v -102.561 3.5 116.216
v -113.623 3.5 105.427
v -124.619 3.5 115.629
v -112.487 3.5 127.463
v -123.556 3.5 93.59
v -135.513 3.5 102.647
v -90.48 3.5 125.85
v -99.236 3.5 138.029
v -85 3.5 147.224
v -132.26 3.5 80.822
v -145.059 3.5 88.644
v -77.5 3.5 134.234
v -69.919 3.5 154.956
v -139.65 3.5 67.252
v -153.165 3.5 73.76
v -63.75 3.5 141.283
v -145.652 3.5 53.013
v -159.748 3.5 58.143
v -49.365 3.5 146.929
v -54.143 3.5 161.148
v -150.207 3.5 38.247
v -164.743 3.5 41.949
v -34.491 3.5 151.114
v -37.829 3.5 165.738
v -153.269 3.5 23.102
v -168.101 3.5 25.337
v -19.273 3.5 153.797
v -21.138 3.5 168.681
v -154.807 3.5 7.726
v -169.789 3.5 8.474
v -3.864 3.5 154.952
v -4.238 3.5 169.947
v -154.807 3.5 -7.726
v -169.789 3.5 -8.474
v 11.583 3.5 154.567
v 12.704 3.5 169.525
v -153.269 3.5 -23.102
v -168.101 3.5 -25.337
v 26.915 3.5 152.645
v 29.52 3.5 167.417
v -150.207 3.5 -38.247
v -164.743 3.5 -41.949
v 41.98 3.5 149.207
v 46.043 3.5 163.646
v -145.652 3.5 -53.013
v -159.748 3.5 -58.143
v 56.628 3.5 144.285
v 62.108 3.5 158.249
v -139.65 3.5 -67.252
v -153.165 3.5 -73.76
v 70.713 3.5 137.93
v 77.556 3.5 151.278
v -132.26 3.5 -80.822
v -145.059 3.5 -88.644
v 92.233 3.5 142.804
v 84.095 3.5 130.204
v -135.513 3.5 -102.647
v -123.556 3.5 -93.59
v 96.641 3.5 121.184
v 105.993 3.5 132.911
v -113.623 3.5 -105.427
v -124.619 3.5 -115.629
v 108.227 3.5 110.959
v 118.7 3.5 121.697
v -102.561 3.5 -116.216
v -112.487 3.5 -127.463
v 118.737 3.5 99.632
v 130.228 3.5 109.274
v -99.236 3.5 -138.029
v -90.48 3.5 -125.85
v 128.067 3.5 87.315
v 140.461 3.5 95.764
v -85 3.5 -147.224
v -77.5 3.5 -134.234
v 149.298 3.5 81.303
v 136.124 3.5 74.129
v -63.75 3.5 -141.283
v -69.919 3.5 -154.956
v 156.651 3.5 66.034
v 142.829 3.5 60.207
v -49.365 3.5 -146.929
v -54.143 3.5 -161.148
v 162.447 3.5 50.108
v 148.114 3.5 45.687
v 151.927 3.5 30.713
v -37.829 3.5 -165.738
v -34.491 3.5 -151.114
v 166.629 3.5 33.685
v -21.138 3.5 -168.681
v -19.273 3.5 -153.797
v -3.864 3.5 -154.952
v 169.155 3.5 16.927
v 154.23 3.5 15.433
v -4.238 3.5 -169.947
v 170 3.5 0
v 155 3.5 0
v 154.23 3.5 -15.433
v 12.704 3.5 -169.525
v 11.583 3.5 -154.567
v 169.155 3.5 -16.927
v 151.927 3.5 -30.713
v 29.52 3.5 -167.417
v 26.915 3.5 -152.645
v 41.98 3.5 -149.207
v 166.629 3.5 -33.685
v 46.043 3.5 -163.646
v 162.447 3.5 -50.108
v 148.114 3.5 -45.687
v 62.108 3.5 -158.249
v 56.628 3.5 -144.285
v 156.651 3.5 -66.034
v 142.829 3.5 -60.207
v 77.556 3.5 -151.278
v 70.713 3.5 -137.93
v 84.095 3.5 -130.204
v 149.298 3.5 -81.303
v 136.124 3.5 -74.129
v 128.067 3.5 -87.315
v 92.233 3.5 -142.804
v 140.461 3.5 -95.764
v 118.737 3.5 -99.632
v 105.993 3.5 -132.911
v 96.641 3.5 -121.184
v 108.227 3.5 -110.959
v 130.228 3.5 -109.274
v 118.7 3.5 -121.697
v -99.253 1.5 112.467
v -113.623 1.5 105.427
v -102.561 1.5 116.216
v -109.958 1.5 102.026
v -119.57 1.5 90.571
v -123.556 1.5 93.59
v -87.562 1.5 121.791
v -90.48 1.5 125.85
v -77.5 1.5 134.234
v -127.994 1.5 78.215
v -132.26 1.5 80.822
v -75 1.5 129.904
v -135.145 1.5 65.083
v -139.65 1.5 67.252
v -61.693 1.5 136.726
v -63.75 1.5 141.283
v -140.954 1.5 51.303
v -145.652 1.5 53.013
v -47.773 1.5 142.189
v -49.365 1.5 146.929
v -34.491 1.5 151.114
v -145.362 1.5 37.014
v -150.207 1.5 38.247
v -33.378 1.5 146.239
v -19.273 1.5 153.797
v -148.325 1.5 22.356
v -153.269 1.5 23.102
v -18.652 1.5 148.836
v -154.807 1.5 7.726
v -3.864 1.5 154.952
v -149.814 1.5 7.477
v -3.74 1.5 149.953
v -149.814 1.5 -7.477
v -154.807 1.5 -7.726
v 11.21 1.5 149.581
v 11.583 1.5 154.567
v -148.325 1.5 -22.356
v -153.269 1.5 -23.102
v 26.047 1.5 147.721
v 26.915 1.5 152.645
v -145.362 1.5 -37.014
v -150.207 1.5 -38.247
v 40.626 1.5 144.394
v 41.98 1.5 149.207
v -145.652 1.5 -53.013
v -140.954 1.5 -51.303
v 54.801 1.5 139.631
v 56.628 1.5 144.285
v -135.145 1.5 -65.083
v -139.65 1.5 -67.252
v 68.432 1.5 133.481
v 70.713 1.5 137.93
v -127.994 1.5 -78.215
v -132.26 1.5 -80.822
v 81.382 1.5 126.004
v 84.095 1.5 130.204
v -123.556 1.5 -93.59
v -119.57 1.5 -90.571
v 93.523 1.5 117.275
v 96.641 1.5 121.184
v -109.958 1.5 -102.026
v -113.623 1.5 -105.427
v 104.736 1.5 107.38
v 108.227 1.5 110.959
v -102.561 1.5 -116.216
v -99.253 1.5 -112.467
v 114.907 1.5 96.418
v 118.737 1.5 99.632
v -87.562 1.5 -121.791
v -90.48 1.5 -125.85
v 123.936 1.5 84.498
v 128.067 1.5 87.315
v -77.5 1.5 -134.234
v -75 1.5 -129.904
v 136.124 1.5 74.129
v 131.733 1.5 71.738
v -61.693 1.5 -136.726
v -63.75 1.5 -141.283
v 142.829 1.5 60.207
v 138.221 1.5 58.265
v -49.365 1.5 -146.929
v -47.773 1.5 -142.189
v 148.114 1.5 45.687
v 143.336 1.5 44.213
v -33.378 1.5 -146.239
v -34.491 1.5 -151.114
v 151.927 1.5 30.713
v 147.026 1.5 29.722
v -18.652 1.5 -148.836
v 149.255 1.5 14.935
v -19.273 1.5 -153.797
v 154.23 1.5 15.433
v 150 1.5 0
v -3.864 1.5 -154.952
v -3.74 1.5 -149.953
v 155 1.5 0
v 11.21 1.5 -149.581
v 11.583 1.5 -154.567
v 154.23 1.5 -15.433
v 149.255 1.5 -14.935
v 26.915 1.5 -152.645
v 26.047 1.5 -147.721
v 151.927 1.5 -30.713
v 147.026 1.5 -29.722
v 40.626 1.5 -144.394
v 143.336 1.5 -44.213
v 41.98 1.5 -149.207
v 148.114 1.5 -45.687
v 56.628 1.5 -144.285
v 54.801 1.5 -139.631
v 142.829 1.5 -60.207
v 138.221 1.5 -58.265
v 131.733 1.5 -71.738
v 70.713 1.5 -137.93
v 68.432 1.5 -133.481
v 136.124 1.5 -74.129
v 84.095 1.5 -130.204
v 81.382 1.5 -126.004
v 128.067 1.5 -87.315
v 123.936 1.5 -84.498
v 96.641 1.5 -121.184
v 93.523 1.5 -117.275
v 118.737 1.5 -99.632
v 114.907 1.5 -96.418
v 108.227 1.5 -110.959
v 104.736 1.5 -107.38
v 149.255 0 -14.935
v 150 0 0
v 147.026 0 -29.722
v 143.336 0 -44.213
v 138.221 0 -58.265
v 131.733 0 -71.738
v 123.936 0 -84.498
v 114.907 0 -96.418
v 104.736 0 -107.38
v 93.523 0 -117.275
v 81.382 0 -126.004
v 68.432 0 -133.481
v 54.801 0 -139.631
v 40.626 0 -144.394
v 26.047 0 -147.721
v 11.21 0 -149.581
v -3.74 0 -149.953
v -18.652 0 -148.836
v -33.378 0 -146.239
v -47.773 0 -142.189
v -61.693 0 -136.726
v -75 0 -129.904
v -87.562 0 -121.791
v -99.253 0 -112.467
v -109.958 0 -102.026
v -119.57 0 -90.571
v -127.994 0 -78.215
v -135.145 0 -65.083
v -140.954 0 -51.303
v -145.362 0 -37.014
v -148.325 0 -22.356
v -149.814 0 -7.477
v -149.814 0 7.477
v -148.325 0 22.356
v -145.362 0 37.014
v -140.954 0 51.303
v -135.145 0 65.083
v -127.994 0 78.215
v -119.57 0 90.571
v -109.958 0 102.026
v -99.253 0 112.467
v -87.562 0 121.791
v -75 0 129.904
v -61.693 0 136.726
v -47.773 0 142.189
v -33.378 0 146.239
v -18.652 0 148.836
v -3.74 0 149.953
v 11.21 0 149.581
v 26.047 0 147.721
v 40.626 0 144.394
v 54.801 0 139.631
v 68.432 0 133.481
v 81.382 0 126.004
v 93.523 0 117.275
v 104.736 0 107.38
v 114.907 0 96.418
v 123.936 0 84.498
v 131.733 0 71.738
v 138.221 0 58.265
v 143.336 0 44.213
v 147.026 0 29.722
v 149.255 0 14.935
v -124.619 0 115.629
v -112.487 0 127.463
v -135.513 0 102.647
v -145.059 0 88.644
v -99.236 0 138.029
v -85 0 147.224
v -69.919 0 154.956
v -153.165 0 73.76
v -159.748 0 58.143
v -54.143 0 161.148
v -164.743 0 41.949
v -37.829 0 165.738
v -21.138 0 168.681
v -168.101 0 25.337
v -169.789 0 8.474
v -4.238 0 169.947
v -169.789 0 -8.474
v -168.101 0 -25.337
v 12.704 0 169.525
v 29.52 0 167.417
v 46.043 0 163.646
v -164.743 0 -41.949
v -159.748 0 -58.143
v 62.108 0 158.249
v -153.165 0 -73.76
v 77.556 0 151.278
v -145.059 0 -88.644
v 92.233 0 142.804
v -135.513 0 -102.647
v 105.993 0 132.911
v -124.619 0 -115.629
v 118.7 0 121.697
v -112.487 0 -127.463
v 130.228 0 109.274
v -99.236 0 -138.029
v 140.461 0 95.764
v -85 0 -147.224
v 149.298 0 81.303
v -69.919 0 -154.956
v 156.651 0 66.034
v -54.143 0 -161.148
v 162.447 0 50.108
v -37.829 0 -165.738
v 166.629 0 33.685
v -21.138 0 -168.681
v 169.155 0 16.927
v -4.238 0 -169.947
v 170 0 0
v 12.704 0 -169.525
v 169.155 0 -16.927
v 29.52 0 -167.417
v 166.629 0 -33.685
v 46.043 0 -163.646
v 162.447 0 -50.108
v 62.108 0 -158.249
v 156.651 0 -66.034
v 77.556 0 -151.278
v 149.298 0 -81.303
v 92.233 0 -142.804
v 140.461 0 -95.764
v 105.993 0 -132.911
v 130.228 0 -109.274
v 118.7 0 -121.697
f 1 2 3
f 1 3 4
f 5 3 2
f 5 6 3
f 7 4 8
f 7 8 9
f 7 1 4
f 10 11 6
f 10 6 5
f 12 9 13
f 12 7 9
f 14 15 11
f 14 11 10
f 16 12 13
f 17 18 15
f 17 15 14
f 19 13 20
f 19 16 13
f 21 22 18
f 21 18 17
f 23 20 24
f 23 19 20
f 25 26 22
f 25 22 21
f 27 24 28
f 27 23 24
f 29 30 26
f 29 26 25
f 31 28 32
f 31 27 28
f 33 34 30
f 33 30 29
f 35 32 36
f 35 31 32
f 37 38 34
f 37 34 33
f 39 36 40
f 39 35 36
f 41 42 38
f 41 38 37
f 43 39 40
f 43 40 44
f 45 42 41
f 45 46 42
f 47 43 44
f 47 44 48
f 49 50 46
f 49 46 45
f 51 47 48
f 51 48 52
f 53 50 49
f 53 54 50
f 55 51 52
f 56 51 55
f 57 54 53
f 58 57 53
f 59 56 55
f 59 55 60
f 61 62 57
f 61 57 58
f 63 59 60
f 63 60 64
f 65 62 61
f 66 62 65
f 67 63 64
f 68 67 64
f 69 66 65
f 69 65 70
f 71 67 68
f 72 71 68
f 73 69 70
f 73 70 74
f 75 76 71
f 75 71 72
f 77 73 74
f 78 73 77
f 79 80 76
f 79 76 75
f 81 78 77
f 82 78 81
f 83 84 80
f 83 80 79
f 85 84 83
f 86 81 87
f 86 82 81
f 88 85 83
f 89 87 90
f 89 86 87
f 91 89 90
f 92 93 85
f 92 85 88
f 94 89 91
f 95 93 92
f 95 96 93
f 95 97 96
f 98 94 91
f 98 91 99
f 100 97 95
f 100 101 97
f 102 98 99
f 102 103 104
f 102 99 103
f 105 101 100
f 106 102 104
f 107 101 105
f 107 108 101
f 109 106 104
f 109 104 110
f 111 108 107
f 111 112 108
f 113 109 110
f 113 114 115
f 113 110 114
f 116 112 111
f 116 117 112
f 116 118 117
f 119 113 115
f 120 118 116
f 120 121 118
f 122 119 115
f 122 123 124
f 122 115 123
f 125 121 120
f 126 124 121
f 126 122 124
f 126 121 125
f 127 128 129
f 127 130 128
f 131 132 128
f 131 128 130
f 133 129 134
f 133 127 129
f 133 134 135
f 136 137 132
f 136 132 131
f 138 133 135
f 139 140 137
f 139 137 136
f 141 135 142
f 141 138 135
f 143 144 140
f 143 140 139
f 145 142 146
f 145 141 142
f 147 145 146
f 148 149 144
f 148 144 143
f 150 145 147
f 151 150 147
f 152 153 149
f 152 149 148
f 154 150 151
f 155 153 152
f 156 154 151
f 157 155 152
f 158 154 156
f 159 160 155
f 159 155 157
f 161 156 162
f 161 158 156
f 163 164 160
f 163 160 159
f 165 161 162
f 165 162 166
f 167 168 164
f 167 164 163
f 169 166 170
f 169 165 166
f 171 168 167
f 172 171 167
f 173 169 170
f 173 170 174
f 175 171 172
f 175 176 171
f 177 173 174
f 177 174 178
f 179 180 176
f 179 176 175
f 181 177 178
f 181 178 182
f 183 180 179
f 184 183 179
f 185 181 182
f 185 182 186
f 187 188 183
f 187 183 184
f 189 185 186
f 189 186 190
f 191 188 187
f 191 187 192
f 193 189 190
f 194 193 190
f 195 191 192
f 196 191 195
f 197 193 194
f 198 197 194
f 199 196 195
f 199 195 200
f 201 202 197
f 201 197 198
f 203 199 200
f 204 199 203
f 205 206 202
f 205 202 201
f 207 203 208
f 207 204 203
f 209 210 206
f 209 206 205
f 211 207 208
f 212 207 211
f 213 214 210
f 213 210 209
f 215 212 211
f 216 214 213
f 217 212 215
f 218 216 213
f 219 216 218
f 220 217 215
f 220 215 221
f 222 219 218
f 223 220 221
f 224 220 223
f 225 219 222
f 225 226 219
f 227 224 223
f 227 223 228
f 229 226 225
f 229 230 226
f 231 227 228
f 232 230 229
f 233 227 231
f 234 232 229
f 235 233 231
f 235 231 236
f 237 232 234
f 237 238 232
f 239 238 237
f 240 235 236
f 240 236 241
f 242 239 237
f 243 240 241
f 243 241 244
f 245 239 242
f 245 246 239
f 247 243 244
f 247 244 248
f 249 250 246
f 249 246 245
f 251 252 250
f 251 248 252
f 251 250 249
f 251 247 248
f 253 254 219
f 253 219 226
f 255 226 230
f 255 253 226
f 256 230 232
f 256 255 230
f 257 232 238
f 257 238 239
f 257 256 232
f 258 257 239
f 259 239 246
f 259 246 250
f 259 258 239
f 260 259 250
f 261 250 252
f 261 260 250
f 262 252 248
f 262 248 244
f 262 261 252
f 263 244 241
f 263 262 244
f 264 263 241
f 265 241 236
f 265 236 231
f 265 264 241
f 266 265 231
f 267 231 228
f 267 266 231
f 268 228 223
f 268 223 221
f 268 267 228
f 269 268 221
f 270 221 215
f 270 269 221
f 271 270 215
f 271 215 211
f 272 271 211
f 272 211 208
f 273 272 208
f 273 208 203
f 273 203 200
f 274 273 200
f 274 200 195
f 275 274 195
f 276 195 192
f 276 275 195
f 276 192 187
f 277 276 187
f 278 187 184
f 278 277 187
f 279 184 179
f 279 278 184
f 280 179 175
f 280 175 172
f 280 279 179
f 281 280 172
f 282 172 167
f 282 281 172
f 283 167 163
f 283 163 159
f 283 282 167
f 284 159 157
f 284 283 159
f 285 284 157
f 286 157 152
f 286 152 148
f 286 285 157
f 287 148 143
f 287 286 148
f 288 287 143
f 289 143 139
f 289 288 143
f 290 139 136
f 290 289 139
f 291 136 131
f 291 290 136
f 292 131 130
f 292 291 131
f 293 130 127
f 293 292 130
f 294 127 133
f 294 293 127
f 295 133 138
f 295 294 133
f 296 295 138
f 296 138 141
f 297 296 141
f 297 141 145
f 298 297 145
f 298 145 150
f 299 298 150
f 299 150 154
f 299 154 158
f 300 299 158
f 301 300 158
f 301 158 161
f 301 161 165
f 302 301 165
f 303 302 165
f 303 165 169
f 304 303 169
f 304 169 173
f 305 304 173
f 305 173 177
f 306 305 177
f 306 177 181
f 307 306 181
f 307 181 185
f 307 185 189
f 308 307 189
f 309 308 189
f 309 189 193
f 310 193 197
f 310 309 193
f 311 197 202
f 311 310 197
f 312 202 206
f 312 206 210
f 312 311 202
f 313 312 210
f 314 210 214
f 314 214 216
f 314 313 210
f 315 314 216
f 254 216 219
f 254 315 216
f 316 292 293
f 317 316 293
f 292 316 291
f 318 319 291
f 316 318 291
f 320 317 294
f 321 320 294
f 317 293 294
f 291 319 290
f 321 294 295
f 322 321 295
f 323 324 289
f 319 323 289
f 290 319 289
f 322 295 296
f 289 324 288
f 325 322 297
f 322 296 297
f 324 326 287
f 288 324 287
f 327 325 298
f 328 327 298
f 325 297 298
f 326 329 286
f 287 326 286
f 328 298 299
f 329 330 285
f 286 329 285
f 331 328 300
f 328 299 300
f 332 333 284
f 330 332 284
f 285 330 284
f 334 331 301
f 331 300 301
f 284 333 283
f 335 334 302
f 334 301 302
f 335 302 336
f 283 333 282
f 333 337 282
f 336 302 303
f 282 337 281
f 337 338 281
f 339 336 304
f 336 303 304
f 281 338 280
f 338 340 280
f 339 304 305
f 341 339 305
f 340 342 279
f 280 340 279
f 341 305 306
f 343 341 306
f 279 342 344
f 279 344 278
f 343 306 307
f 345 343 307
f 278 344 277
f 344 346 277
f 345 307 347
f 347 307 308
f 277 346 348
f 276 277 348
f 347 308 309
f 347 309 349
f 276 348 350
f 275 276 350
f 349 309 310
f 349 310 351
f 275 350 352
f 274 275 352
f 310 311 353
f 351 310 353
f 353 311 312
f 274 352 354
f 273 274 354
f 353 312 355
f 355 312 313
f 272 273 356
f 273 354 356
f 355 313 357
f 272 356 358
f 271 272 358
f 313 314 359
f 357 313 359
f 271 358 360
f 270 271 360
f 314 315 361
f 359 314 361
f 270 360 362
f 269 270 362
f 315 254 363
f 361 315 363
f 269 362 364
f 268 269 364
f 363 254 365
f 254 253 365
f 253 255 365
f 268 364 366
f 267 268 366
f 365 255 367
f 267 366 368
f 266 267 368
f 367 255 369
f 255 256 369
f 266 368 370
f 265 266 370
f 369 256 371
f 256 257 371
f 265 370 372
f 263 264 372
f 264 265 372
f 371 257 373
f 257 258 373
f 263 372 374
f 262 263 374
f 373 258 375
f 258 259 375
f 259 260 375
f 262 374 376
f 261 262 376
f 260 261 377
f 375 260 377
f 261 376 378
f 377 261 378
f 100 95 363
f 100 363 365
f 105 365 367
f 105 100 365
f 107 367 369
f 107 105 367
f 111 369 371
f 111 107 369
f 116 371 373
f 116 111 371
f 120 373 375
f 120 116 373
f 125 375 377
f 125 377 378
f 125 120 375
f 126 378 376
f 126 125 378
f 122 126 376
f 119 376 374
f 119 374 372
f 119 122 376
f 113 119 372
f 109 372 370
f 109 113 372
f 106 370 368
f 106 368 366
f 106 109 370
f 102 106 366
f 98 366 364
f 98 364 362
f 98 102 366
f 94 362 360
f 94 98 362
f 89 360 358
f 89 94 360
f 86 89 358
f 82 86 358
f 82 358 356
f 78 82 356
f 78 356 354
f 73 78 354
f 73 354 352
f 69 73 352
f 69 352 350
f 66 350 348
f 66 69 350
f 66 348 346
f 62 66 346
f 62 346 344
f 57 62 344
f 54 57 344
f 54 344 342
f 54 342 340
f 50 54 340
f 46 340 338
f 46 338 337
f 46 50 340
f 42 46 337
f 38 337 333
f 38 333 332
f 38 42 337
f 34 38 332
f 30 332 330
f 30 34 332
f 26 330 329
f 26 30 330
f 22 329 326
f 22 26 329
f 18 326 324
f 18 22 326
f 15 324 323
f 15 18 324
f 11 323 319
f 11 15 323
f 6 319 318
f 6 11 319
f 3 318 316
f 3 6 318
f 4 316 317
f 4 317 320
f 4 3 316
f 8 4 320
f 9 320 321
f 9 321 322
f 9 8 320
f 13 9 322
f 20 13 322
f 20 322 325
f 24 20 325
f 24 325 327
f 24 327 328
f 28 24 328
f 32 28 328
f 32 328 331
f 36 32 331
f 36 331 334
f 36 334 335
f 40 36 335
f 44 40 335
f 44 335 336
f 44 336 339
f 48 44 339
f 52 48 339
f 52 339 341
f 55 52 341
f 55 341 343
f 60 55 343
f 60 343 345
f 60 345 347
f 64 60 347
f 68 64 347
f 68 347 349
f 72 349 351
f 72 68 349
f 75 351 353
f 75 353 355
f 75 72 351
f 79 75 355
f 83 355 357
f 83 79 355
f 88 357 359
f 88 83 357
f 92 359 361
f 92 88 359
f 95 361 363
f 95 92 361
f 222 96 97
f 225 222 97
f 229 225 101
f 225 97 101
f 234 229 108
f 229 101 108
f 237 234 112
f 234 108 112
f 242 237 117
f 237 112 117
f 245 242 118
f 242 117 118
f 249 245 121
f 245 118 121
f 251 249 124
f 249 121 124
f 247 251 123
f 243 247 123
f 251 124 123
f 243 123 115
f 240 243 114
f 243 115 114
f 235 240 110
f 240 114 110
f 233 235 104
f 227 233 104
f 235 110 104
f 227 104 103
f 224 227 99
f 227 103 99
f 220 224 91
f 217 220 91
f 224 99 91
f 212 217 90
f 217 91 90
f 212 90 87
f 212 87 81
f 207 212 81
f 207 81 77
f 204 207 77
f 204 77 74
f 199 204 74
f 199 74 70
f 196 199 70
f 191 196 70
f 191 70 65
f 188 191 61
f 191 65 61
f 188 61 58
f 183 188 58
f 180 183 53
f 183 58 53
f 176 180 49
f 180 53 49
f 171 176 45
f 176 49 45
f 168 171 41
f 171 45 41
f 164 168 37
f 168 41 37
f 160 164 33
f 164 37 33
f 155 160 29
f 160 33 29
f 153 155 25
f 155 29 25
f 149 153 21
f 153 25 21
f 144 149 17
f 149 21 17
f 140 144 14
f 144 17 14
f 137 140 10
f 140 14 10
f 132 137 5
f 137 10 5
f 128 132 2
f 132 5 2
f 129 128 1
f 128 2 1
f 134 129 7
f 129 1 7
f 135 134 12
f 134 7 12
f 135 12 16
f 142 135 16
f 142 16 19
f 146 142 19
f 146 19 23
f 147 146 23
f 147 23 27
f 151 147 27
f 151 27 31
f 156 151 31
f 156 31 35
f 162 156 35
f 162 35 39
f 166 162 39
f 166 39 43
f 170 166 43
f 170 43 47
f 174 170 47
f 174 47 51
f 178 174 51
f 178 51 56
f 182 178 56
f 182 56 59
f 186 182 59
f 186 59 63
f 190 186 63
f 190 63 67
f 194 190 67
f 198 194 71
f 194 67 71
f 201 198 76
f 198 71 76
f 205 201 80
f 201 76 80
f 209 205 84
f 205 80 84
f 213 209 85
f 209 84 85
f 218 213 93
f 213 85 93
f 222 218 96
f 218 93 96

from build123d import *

# Parameters (mm, degrees)
SKETCH_1_R          = 160
SKETCH_1_R_2        = 150
EXTRUDE_1_DEPTH     = 1.5
SKETCH_2_R          = 160
SKETCH_2_R_2        = 152.5
EXTRUDE_2_DEPTH     = 2
SKETCH_3_R          = 170
SKETCH_3_R_2        = 160
EXTRUDE_3_DEPTH     = 3.5
SKETCH_4_R          = 155
SKETCH_4_R_2        = 152.5
CUT_EXTRUDE_1_DEPTH = 2


with BuildPart() as part:
    # ｽｹｯﾁ1 → ﾎﾞｽ - 押し出し1 (new body)
    with BuildSketch(Plane(origin=(0, 0, 0), x_dir=(1, 0, 0), z_dir=(0, 1, 0))):
        Circle(SKETCH_1_R)
        Circle(SKETCH_1_R_2, mode=Mode.SUBTRACT)
    extrude(amount=EXTRUDE_1_DEPTH)

    # ｽｹｯﾁ2 → ﾎﾞｽ - 押し出し2 (add)
    with BuildSketch(Plane(origin=(0, 1.5, 0), x_dir=(1, 0, 0), z_dir=(0, 1, 0))):
        Circle(SKETCH_2_R)
        Circle(SKETCH_2_R_2, mode=Mode.SUBTRACT)
    extrude(amount=EXTRUDE_2_DEPTH)

    # ｽｹｯﾁ3 → ﾎﾞｽ - 押し出し3 (add)
    with BuildSketch(Plane(origin=(0, 3.5, 0), x_dir=(1, 0, 0), z_dir=(0, 1, 0))):
        Circle(SKETCH_3_R)
        Circle(SKETCH_3_R_2, mode=Mode.SUBTRACT)
    extrude(amount=-EXTRUDE_3_DEPTH)

    # ｽｹｯﾁ4 → ｶｯﾄ - 押し出し1 (cut)
    with BuildSketch(Plane(origin=(0, 3.5, 0), x_dir=(1, 0, 0), z_dir=(0, 1, 0))):
        Circle(SKETCH_4_R)
        Circle(SKETCH_4_R_2, mode=Mode.SUBTRACT)
    extrude(amount=-CUT_EXTRUDE_1_DEPTH, mode=Mode.SUBTRACT)


solid = part.part
